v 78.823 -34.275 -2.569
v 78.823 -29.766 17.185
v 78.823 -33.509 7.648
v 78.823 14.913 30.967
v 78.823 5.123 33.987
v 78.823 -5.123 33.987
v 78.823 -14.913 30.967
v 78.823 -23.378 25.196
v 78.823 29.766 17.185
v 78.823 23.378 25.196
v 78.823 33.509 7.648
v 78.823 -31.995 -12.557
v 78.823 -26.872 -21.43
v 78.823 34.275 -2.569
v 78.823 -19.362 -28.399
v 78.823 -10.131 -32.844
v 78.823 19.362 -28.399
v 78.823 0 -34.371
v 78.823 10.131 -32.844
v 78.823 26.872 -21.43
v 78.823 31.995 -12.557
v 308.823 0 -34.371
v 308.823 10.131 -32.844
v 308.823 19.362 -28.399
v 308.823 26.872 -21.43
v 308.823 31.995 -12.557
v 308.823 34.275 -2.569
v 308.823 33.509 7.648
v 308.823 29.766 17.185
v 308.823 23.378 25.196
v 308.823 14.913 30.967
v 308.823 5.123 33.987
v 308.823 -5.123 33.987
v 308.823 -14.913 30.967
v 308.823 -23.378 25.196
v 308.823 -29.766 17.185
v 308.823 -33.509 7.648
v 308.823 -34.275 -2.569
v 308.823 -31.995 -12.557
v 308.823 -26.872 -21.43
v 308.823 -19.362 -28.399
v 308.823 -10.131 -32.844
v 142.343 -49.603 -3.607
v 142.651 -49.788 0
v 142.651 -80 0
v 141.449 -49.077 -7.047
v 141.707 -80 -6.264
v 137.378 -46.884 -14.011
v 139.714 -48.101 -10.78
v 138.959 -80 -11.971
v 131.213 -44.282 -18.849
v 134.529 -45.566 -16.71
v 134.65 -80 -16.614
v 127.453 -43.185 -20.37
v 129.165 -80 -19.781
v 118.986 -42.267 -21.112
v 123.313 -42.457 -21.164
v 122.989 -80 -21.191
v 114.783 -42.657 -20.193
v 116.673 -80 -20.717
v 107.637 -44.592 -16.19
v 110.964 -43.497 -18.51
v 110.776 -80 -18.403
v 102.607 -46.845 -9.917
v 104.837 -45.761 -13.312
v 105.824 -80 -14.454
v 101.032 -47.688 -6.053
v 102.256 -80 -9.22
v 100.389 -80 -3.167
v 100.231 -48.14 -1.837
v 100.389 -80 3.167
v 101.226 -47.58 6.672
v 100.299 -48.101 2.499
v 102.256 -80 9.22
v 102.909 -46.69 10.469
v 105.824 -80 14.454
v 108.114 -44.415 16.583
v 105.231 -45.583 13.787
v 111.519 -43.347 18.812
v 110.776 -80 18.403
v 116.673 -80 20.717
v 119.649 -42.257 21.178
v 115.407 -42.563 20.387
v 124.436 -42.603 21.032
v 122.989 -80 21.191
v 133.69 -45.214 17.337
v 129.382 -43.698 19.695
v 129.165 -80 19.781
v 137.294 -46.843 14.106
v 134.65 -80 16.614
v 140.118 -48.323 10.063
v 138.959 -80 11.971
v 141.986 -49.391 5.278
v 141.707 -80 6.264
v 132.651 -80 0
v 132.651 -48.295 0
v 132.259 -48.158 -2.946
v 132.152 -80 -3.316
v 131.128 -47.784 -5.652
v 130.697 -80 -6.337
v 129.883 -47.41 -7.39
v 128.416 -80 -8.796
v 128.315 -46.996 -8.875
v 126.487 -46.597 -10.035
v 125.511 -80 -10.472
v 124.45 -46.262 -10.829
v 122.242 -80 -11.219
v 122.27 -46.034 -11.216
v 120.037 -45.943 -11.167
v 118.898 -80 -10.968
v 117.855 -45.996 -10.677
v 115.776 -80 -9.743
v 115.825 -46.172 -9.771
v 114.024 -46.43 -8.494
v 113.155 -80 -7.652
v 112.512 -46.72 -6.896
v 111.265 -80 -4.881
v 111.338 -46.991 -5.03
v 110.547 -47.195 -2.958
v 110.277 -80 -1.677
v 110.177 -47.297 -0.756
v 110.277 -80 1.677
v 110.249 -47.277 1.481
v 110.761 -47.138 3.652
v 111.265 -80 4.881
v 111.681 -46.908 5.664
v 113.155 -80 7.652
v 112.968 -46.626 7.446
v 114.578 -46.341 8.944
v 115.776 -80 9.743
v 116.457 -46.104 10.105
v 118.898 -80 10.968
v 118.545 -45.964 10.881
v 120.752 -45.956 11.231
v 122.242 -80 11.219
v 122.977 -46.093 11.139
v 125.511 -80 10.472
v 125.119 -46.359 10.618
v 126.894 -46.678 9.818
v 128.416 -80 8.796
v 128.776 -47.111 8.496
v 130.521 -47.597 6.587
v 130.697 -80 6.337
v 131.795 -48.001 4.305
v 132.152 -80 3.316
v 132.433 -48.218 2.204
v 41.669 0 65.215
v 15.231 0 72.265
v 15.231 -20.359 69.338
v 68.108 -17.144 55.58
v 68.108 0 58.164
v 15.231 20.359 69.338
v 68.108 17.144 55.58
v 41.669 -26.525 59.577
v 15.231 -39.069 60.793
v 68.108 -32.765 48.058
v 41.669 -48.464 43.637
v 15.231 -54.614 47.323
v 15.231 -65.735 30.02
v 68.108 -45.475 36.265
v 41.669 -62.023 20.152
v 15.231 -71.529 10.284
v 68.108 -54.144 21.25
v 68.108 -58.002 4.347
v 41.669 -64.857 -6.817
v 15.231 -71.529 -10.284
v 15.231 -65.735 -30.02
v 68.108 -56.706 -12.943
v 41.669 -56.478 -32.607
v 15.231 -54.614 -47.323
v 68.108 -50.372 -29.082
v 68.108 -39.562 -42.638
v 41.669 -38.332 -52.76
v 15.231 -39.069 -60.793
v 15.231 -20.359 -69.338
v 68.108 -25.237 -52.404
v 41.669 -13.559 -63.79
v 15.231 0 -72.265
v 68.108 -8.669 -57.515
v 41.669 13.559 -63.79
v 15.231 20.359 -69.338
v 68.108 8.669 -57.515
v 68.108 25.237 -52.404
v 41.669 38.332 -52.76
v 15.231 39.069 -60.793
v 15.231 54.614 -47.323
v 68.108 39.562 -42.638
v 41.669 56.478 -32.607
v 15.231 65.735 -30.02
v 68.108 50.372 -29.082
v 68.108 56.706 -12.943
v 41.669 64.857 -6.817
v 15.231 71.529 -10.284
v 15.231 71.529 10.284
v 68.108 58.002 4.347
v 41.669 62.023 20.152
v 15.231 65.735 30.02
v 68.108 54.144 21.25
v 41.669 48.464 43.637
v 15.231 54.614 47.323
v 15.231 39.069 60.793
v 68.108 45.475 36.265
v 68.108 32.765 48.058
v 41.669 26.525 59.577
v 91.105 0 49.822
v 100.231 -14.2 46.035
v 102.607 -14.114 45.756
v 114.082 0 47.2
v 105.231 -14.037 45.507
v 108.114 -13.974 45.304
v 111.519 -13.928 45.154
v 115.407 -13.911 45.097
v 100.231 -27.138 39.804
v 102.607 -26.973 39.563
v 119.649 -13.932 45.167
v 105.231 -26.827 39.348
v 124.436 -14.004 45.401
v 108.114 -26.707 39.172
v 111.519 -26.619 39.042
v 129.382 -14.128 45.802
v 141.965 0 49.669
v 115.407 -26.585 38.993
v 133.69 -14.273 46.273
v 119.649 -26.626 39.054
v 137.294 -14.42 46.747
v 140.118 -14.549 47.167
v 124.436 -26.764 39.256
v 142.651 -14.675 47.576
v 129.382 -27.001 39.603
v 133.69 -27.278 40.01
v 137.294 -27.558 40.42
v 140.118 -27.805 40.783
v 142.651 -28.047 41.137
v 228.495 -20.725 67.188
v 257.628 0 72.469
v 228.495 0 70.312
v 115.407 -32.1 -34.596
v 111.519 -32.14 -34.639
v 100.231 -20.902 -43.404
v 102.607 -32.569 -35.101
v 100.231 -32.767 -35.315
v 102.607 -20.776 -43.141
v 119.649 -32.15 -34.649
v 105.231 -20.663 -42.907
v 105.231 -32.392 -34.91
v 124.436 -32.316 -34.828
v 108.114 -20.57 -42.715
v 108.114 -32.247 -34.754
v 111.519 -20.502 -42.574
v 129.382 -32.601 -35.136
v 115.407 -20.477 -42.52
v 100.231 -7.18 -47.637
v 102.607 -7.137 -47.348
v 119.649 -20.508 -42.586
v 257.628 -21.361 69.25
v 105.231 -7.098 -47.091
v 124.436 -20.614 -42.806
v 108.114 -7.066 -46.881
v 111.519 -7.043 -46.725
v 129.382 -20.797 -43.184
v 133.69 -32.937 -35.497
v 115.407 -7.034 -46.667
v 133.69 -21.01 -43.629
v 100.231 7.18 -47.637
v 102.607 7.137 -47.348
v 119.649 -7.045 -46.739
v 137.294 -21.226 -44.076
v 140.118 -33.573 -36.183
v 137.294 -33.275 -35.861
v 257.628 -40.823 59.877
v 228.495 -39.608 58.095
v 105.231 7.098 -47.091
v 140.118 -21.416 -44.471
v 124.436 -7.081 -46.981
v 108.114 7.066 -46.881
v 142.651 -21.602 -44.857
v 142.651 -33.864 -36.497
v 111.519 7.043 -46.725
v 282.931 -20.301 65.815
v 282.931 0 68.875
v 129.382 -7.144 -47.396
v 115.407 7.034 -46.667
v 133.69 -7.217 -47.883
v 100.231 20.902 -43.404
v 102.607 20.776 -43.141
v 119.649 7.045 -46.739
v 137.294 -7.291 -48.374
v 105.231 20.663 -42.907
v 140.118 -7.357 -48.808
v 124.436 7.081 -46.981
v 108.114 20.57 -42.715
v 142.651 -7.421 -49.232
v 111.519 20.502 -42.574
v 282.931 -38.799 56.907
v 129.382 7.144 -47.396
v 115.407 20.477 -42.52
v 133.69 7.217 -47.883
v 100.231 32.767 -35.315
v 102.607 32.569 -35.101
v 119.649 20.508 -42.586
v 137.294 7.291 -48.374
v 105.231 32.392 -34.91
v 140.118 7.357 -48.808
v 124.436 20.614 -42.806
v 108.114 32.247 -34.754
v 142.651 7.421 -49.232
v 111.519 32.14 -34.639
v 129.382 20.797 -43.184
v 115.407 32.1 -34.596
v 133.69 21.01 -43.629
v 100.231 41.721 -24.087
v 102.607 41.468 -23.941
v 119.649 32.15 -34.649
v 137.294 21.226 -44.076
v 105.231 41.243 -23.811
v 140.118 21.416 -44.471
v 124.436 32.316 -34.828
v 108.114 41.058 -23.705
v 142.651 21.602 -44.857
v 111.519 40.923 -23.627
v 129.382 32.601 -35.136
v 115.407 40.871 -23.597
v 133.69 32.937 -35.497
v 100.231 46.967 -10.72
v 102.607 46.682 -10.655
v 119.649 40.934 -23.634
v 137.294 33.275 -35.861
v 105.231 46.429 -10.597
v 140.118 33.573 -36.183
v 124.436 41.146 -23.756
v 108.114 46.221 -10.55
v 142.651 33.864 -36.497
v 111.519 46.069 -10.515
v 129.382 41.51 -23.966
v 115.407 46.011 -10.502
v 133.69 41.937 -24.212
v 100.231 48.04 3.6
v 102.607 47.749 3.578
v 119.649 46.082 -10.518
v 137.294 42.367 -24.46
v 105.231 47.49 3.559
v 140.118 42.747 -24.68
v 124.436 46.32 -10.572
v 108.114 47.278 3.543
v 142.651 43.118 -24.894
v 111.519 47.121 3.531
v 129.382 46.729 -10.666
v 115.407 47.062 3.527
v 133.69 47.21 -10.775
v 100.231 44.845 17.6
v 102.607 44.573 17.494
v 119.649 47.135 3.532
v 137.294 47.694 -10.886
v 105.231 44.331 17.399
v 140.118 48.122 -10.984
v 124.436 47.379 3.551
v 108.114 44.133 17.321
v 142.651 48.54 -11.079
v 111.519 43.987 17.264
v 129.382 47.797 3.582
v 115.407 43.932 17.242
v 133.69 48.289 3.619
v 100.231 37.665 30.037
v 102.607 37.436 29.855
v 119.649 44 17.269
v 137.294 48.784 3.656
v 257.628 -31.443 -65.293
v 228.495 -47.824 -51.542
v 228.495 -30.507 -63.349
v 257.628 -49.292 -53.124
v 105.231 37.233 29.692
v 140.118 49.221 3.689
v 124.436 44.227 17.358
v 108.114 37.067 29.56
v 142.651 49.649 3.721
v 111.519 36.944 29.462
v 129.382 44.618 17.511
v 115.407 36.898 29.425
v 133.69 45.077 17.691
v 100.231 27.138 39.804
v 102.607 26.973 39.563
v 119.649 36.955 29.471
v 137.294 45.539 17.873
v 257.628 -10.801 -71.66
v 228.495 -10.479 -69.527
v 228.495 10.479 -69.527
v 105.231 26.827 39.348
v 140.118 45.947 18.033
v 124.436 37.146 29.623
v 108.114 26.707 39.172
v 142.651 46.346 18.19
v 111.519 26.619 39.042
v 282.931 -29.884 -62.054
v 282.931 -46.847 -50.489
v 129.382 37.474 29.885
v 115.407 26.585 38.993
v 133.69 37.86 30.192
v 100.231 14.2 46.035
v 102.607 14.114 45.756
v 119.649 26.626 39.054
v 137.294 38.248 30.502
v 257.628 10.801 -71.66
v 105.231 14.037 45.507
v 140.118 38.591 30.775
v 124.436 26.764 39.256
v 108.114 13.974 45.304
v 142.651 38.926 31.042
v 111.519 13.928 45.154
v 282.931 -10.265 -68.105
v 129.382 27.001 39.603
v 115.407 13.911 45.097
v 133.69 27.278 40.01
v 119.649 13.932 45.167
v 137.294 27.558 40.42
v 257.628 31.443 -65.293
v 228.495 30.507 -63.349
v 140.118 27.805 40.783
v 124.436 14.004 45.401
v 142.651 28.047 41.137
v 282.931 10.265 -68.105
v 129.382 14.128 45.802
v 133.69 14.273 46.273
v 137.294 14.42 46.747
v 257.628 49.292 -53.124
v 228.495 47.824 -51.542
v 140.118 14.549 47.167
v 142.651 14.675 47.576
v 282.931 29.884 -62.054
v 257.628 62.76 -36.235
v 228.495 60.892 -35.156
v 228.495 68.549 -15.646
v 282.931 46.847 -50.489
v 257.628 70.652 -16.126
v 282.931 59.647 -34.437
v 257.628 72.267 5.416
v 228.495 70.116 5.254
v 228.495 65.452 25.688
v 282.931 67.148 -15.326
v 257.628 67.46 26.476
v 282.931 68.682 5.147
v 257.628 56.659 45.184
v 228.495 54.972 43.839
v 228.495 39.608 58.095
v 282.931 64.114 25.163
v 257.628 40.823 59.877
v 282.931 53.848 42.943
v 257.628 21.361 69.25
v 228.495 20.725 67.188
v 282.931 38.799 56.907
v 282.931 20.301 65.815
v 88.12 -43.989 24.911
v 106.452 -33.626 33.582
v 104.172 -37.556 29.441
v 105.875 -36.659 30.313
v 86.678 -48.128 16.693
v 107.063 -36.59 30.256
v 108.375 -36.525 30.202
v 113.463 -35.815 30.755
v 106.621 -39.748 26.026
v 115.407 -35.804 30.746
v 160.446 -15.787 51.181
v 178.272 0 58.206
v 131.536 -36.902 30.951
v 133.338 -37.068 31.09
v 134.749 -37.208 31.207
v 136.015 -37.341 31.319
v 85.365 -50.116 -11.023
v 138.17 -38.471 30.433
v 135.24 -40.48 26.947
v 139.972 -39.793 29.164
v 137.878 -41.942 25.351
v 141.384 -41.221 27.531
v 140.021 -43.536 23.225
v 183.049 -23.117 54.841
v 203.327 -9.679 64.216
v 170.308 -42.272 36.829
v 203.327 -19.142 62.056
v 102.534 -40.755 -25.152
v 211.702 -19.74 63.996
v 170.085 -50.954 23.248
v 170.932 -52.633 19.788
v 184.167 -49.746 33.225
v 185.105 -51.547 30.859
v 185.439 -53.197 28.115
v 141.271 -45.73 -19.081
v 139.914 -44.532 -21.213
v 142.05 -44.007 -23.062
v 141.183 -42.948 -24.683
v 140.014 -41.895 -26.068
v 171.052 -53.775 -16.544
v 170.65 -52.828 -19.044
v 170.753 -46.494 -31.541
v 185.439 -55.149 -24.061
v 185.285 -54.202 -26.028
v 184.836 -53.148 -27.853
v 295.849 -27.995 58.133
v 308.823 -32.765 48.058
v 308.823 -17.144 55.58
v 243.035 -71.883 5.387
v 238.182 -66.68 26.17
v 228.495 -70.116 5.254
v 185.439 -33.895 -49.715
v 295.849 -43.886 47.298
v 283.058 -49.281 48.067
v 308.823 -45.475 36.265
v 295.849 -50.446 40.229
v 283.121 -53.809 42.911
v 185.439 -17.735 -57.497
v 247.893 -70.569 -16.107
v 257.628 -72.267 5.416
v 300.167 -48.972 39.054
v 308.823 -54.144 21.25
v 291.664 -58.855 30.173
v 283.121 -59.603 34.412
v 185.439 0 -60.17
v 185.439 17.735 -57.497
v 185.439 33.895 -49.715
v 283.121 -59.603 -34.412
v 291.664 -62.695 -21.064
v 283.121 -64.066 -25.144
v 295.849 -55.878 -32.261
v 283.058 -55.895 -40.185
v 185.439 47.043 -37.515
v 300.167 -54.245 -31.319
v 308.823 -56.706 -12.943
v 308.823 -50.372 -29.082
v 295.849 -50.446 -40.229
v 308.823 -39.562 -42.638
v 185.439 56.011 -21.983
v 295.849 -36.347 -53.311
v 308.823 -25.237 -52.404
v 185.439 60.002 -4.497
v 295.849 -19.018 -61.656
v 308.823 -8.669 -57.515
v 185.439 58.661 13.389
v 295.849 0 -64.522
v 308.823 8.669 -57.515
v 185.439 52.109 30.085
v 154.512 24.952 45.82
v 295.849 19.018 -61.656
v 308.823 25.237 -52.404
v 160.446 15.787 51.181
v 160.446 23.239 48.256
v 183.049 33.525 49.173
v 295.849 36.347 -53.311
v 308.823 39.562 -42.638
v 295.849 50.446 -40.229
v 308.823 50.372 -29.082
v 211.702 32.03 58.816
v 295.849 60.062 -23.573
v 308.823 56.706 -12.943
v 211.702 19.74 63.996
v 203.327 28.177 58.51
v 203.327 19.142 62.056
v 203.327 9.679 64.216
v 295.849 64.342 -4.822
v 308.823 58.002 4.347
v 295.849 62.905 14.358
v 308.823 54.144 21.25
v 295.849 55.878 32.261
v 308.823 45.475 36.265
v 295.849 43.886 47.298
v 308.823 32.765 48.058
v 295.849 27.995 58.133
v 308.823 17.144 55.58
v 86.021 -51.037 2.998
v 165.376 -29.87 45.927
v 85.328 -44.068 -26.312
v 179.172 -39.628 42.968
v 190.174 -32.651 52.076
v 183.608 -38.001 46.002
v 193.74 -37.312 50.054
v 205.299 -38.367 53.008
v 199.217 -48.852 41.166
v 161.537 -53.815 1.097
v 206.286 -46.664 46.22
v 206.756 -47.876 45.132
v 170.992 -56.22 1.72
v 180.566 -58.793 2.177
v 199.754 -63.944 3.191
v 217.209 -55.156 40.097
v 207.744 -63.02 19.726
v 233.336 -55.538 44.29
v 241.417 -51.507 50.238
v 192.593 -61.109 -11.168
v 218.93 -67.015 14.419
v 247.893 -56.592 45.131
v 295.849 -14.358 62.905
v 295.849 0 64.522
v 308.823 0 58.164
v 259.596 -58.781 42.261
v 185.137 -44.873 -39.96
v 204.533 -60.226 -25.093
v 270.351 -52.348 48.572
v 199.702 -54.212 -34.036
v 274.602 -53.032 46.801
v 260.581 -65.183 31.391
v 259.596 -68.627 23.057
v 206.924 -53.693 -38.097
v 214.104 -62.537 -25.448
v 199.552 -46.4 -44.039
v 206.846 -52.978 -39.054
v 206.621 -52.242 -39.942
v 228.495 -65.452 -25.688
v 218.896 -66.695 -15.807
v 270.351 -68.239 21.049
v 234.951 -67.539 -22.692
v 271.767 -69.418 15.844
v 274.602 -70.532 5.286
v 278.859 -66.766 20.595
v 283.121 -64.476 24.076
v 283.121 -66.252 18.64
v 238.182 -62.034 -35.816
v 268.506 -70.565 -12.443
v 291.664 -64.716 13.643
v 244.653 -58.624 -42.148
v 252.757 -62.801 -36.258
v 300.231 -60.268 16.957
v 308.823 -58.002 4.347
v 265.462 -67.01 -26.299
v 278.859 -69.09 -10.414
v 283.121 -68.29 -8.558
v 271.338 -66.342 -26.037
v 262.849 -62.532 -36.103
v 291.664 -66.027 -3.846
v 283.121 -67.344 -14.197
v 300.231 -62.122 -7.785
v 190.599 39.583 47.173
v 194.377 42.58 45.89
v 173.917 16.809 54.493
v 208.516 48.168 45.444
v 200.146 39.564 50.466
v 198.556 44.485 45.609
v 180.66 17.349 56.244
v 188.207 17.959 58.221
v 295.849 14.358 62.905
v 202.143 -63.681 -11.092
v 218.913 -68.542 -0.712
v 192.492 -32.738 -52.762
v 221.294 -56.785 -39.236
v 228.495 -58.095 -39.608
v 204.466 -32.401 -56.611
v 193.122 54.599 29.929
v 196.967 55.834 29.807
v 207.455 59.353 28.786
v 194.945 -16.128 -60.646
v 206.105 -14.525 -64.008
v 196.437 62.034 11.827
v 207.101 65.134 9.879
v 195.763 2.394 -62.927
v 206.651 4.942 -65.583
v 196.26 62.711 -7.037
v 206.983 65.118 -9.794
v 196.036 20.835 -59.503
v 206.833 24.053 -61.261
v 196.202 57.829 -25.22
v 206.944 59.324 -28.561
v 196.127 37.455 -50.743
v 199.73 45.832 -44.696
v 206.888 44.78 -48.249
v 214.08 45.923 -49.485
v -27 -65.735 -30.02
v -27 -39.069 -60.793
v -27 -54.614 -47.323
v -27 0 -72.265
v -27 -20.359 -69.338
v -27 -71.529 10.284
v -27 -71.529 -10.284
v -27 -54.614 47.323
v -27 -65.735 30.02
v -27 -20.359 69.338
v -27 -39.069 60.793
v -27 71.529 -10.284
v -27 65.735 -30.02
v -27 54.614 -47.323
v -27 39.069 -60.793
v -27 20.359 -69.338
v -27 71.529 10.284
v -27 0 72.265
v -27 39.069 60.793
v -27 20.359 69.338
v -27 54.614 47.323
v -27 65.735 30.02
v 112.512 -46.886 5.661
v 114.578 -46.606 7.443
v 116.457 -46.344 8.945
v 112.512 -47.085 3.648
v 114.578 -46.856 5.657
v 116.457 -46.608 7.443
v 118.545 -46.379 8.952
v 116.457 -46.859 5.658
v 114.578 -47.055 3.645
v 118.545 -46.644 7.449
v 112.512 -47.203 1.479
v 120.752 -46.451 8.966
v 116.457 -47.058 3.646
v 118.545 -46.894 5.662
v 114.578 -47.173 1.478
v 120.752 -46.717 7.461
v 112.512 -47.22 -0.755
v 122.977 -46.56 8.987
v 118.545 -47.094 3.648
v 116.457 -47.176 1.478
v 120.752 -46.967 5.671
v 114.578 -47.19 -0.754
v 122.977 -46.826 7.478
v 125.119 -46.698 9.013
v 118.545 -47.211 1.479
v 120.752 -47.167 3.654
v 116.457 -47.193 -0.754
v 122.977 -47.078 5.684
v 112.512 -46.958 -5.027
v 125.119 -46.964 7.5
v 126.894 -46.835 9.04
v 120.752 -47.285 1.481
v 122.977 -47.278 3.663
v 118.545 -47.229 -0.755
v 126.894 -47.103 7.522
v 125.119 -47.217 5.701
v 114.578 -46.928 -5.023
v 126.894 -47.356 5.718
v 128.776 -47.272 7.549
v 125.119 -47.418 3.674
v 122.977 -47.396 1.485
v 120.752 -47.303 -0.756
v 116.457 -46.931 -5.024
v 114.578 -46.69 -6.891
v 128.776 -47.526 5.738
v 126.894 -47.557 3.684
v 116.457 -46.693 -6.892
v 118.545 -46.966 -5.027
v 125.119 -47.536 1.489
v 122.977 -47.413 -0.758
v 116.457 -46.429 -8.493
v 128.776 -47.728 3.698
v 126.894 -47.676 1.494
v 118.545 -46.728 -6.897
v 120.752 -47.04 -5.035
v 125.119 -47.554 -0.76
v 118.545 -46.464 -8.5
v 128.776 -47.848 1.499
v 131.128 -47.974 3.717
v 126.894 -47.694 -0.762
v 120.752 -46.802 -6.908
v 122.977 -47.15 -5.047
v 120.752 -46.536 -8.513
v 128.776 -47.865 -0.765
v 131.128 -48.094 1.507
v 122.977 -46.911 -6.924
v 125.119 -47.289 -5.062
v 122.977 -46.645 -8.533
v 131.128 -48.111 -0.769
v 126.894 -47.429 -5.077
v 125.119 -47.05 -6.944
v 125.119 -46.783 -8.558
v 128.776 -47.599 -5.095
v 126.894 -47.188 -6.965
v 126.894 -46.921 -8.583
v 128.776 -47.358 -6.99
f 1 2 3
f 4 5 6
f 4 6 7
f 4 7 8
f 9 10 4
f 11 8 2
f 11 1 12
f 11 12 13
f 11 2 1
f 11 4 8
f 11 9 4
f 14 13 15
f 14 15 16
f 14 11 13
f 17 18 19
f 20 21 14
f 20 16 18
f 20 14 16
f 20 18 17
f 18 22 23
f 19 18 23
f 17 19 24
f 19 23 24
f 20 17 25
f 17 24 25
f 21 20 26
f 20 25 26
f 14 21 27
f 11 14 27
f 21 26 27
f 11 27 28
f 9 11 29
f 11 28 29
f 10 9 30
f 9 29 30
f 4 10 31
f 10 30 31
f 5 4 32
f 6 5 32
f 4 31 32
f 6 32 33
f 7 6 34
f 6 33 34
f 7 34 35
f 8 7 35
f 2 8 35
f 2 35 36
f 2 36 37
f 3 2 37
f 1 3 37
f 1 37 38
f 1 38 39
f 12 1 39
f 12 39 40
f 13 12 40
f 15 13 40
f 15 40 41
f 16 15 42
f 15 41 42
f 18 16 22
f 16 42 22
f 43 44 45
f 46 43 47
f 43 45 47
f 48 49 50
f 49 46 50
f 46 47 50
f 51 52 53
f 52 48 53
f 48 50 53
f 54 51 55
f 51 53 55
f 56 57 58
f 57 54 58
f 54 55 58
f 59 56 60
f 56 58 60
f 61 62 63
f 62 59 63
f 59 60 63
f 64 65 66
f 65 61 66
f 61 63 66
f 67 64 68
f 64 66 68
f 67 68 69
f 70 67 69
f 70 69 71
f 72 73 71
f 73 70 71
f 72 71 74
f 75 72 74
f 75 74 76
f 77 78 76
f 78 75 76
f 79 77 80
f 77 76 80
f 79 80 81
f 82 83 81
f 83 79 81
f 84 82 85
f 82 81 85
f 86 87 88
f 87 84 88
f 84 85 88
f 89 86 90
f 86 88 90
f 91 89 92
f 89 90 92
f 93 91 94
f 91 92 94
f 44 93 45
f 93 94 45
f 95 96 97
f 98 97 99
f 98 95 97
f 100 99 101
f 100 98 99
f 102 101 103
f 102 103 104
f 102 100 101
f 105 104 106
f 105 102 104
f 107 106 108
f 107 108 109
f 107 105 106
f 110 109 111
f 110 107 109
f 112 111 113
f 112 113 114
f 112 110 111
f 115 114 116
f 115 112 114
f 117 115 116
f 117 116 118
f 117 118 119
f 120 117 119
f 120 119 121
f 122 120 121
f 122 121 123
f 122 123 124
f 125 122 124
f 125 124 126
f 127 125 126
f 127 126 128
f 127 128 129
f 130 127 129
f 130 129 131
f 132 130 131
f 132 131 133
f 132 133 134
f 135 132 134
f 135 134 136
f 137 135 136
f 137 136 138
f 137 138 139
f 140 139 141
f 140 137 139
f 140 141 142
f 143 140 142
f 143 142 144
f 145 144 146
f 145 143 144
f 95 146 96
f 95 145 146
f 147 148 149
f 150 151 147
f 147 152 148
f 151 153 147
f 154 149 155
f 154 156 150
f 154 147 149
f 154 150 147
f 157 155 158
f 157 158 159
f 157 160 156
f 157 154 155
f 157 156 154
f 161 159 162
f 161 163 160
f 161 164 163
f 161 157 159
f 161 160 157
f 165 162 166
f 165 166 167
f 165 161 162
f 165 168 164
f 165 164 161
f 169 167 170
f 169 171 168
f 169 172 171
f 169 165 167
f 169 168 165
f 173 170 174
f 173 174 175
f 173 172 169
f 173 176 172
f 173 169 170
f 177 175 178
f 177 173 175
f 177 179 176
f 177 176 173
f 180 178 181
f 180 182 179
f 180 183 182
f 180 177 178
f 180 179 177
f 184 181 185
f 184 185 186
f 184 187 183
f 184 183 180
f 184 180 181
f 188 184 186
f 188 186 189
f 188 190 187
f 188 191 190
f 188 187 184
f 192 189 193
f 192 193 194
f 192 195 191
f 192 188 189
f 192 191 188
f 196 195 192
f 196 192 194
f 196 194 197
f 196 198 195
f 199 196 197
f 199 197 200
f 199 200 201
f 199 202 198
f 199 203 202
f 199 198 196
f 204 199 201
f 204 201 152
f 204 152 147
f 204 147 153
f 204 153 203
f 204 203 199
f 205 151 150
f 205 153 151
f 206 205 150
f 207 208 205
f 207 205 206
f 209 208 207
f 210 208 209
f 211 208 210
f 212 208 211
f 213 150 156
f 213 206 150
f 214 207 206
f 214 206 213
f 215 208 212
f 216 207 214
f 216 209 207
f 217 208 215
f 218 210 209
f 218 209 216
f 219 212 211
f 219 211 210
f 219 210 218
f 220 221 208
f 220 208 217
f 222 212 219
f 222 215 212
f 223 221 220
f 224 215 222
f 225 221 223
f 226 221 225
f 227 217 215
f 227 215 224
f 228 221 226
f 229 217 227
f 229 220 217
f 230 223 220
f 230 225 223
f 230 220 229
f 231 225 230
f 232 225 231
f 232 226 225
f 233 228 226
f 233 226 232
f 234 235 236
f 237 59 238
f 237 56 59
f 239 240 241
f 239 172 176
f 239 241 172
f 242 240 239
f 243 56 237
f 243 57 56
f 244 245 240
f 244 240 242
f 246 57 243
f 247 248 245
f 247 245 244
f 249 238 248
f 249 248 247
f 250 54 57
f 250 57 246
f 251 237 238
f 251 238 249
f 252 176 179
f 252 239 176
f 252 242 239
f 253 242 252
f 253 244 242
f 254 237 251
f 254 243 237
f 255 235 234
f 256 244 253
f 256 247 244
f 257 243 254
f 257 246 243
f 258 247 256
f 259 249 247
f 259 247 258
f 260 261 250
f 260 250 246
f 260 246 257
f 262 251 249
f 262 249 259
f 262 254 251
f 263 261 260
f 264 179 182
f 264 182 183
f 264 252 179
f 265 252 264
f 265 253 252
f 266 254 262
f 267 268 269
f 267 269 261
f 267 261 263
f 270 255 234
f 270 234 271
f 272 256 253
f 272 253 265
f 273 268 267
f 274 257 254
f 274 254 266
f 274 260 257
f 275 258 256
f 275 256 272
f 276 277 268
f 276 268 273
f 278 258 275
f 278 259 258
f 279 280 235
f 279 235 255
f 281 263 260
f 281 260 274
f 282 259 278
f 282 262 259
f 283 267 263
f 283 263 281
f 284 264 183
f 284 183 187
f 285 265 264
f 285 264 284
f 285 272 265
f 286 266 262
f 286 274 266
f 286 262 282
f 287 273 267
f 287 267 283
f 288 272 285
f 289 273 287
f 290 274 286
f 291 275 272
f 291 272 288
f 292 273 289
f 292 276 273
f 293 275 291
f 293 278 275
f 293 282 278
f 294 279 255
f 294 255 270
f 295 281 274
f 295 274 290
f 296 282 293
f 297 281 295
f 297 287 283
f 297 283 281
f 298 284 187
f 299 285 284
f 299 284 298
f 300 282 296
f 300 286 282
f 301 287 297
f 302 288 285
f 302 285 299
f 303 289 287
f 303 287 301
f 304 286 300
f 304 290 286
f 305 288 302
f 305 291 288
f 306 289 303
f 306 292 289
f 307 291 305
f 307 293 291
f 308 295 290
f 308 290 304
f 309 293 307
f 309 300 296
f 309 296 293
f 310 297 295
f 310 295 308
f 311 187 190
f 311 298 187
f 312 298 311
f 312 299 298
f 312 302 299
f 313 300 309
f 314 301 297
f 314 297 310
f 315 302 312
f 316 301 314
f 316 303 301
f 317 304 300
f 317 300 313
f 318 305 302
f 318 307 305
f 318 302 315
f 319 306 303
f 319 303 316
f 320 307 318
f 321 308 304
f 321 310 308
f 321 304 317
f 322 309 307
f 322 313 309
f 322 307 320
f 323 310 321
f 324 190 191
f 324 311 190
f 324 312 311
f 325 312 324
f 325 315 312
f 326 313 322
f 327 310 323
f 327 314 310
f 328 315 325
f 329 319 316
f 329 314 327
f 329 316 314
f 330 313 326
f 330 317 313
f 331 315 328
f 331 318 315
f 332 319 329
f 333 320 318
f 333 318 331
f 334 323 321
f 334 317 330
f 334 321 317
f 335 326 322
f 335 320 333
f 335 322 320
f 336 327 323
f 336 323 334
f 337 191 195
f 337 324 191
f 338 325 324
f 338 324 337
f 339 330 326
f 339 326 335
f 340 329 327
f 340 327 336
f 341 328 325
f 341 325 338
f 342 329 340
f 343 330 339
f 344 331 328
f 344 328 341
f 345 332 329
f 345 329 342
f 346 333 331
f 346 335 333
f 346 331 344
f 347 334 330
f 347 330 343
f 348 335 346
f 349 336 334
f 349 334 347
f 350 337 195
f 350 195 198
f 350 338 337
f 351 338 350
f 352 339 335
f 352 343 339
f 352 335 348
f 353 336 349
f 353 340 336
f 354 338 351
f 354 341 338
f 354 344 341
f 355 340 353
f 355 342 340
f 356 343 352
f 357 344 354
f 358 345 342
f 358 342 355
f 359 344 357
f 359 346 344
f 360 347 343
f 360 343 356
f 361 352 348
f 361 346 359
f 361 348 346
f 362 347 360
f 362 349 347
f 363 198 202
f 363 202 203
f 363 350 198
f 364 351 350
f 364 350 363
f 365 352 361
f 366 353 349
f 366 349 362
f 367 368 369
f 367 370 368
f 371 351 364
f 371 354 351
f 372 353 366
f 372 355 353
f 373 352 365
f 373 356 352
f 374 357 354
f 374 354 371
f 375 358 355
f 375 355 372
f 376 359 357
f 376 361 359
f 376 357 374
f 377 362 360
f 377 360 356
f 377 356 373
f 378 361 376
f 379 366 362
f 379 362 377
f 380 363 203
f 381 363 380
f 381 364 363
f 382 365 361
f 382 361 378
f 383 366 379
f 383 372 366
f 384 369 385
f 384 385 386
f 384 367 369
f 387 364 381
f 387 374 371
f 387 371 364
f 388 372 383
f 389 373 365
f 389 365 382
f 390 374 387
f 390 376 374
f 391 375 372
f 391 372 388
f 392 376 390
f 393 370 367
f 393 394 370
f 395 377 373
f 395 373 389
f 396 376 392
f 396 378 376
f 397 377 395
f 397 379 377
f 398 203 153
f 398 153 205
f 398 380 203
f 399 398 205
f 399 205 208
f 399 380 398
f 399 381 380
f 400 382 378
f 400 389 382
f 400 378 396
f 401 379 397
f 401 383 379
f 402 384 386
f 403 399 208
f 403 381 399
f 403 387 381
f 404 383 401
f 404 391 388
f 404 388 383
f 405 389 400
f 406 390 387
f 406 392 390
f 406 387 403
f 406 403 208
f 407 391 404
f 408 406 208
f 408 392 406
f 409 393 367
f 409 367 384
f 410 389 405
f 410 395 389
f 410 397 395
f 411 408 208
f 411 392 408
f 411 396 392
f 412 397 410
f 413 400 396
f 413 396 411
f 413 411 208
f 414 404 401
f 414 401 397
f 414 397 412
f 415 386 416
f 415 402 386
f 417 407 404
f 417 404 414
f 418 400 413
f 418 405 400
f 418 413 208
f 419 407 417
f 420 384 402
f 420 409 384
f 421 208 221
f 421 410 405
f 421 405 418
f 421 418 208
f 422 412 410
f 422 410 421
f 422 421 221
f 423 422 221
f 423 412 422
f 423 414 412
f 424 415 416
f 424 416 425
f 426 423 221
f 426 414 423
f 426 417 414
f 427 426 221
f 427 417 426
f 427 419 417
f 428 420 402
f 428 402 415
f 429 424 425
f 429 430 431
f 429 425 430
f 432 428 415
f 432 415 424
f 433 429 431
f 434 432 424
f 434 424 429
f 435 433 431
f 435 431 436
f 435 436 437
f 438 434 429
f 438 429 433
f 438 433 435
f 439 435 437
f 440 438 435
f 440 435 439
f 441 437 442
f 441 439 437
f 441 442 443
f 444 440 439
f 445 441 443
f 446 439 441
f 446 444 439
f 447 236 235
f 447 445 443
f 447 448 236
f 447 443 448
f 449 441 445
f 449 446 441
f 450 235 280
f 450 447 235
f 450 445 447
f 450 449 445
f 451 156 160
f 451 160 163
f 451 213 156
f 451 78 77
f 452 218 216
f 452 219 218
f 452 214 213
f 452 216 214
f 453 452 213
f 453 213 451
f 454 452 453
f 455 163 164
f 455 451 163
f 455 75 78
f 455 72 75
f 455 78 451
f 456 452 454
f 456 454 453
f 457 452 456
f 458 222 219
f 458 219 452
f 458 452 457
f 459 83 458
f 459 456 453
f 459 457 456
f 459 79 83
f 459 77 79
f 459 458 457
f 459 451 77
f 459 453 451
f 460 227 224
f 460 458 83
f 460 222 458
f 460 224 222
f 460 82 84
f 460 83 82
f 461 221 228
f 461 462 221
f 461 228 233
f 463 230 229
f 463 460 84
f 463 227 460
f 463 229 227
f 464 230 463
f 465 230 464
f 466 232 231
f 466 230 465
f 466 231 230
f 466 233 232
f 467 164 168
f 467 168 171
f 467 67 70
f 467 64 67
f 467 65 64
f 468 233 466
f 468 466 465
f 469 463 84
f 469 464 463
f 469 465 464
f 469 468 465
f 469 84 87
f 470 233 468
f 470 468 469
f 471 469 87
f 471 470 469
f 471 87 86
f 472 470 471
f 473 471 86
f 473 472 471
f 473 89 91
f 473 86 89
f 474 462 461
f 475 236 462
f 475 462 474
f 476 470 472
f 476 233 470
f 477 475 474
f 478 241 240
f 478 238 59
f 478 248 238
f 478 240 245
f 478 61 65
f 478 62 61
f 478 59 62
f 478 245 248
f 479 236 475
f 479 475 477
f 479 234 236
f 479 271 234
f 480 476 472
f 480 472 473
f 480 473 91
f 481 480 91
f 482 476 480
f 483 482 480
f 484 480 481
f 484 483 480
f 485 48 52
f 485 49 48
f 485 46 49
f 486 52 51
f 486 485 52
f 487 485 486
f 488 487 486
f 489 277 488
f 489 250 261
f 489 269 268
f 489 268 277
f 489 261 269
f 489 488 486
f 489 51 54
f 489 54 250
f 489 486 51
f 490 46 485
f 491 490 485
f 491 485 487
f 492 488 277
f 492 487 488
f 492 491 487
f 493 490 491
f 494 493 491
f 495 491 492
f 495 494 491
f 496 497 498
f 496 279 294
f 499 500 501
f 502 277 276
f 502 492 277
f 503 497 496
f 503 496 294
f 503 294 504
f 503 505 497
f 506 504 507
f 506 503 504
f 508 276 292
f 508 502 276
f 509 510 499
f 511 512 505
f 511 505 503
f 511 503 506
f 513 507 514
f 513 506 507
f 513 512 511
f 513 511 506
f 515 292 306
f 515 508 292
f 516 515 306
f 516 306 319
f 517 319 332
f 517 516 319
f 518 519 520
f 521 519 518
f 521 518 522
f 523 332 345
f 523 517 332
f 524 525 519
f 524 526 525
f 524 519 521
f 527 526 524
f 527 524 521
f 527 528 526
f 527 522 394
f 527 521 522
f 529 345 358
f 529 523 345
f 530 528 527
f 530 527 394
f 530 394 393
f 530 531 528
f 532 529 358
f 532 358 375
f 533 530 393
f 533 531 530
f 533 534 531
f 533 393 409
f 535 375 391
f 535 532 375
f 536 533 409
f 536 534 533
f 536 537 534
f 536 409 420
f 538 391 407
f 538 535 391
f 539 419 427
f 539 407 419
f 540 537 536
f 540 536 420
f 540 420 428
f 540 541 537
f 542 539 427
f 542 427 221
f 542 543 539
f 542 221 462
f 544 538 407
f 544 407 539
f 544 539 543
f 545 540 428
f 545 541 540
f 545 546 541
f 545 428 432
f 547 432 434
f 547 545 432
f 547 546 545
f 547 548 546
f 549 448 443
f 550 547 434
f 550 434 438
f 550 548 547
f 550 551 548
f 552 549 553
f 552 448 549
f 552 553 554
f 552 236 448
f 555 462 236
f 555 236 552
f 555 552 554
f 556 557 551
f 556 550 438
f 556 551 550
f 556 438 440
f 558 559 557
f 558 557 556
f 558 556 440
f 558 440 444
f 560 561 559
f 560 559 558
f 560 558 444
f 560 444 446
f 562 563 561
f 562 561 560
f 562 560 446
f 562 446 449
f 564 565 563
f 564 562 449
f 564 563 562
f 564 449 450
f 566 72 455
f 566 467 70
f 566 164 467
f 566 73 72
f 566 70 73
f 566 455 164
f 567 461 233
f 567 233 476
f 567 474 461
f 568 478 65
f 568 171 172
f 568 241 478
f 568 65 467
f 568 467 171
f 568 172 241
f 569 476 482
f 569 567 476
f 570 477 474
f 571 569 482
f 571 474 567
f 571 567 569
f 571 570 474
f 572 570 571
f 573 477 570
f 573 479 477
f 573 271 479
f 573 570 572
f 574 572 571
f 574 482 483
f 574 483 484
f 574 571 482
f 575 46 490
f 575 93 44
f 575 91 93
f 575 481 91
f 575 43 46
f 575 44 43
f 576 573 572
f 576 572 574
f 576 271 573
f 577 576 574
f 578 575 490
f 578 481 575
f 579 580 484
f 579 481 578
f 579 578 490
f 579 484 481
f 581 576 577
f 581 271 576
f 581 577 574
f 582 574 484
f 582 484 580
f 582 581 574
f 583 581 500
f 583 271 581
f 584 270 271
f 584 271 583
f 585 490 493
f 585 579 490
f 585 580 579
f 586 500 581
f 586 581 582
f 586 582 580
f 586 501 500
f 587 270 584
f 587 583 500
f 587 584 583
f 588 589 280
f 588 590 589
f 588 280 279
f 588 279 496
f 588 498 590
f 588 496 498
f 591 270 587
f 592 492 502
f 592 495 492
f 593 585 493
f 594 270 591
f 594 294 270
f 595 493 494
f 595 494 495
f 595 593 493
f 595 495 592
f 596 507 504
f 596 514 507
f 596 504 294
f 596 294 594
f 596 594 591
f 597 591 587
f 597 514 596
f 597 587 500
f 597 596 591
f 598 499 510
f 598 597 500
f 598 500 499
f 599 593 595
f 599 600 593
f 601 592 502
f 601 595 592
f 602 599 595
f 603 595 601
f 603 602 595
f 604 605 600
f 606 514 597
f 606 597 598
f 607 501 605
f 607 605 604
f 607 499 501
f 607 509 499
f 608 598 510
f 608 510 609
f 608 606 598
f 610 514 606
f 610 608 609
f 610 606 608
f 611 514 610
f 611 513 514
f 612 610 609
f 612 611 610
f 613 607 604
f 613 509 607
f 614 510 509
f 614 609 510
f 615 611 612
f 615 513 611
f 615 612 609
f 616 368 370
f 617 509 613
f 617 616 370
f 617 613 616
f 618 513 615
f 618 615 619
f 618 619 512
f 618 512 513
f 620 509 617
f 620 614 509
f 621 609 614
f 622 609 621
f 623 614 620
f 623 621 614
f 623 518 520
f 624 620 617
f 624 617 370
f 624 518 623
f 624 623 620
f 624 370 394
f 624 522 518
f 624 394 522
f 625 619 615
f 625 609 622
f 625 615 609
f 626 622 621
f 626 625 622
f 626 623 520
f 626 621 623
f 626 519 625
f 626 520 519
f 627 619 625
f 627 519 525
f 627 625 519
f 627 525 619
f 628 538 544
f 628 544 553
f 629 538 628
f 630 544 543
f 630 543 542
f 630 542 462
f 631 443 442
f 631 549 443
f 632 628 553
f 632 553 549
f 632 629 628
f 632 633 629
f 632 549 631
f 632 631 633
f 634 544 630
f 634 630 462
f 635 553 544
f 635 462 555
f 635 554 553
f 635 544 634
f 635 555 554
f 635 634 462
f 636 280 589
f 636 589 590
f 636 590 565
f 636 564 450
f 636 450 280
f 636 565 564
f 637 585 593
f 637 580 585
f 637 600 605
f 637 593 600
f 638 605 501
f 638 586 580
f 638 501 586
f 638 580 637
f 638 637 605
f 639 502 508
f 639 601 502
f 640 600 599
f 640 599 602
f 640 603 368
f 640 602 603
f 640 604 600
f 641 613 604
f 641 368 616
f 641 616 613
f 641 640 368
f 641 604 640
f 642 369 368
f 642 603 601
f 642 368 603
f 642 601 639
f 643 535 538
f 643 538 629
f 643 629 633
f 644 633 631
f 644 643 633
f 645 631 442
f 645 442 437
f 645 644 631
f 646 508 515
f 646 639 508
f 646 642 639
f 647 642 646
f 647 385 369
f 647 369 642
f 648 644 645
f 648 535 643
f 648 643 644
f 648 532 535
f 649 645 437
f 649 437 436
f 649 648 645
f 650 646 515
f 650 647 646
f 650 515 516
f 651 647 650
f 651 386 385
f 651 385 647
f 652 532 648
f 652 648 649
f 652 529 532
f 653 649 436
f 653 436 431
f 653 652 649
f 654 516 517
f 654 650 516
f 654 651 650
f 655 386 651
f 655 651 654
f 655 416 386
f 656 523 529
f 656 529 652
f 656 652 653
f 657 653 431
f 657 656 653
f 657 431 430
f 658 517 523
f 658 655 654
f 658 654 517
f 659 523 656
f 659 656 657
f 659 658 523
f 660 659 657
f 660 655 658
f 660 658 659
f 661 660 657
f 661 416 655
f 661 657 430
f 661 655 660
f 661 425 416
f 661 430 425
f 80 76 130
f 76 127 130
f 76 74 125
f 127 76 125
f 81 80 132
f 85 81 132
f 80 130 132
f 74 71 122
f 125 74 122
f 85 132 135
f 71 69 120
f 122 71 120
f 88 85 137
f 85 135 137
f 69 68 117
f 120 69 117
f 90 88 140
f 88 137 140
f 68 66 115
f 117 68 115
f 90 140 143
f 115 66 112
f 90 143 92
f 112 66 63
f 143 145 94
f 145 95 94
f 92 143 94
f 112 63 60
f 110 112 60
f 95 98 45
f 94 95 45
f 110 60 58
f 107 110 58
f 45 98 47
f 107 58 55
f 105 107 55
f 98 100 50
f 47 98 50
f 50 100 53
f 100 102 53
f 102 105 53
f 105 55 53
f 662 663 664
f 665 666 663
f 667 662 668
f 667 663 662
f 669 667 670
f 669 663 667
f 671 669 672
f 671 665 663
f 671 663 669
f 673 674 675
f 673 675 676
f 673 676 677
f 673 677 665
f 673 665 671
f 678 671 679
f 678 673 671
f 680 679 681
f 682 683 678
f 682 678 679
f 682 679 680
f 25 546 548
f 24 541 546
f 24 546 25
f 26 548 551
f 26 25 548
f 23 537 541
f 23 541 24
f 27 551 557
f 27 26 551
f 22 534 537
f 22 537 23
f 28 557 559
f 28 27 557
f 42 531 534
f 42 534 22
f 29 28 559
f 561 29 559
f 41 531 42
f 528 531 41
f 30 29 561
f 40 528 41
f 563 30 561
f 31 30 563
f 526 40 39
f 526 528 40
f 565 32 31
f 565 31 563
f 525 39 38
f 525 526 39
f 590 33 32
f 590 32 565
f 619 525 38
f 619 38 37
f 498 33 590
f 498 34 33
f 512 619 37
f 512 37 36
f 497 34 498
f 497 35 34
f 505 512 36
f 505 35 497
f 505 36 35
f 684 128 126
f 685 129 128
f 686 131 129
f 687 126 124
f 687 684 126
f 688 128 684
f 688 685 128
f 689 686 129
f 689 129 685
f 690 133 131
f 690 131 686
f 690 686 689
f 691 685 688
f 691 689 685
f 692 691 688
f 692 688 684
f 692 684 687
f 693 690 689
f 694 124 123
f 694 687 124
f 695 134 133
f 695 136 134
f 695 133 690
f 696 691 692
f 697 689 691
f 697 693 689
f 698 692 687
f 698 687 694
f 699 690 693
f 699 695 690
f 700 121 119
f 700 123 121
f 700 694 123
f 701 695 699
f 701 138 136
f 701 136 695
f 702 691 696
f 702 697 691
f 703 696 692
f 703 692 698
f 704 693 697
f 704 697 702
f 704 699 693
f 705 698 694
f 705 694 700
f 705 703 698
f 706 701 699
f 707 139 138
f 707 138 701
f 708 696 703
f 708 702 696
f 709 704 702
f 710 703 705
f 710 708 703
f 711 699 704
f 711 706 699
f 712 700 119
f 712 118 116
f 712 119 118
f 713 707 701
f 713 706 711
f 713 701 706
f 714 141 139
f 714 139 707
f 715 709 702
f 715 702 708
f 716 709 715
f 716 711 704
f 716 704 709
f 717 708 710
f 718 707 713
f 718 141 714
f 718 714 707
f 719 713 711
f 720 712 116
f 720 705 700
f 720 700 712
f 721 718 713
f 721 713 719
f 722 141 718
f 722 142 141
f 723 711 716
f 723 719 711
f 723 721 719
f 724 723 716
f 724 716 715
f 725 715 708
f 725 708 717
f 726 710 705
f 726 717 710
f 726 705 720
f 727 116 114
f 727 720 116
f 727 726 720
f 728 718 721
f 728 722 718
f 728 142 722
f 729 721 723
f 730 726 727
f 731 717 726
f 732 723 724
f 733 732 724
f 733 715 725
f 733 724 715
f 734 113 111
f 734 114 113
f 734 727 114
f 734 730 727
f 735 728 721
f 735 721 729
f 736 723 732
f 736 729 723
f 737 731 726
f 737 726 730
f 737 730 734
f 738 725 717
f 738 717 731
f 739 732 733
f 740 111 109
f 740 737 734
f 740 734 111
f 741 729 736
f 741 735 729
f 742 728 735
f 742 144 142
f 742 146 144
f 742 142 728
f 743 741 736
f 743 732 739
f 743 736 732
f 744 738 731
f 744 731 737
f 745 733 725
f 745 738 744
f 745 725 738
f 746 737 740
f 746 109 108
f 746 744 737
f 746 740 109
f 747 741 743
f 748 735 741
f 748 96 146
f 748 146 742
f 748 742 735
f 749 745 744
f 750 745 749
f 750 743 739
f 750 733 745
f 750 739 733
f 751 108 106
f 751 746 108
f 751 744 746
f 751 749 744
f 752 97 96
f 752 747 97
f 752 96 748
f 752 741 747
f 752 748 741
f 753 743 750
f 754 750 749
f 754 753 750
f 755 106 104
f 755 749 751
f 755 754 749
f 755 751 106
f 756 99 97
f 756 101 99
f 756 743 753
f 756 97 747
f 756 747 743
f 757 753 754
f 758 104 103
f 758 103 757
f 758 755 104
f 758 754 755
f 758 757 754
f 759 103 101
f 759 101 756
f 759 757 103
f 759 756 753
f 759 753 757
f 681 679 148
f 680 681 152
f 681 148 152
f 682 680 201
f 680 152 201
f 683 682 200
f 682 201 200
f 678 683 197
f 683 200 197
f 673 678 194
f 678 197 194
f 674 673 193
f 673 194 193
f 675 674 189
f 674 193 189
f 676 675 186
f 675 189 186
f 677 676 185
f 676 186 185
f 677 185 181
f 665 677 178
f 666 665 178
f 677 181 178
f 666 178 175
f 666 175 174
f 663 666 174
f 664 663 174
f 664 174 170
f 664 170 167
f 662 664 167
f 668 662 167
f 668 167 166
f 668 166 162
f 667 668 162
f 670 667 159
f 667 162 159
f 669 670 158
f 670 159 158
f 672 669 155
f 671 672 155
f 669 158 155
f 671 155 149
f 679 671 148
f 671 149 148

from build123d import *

# Parameters (mm, degrees)
SKETCH_2_R           = 34.370841625
CUT_EXTRUDE_1_DEPTH  = 230
EXTRUDE_1_DEPTH      = 33
EXTRUDE_1_DEPTH_BACK = 10
SKETCH_3_R           = 21.25
SKETCH_3_R_2         = 11.25
SKETCH_4_R           = 72.26496
EXTRUDE_1_2_DEPTH    = 27


with BuildPart() as part:
    # 草圖1 → 旋轉1 (revolve)
    with BuildSketch(Plane.XY, mode=Mode.PRIVATE) as revolve_1_sk:
        with BuildLine():
            Line((0, 0), (0, 72.26496))
            Line((0, 72.26496), (15.231045419, 72.26496))
            Line((15.231045419, 72.26496), (68.107845419, 58.16448))
            add(Edge.make_bspline(
                [(68.107845419, 58.16448), (147.660376362, 17.815554571), (226.419832208, 105.291746385), (308.823182562, 58.16448)],
                knots=[0, 0, 0, 0, 1, 1, 1, 1], degree=3))
            Line((308.823182562, 58.16448), (308.823182562, 0))
            Line((308.823182562, 0), (0, 0))
        make_face()
    revolve(revolve_1_sk.sketch.rotate(Axis((0, 0, 0), (1, 0, 0)), 90), axis=Axis((0, 0, 0), (1, 0, 0)))

    # 草圖2 → 除料-伸長1 (cut)
    with BuildSketch(Plane(origin=(308.823182562, 0, 0), x_dir=(0, 0, -1), z_dir=(1, 0, 0))):
        Circle(SKETCH_2_R)
    extrude(amount=-CUT_EXTRUDE_1_DEPTH, mode=Mode.SUBTRACT)

    # 草圖3 → Extrude 1 (add, two sides: drawn at the far end of the back side and taken through both)
    with BuildSketch(Plane(origin=(0, -70, 0), x_dir=(1, 0, 0), z_dir=(0, 1, 0)).offset(-EXTRUDE_1_DEPTH_BACK)):
        with Locations((121.401340983, 0)):
            Circle(SKETCH_3_R)
        with Locations((121.401340983, 0)):
            Circle(SKETCH_3_R_2, mode=Mode.SUBTRACT)
    extrude(amount=EXTRUDE_1_DEPTH + EXTRUDE_1_DEPTH_BACK)

    # 草圖4 → Extrude 1 2 (add)
    with BuildSketch(Plane.ZY):
        Circle(SKETCH_4_R)
    extrude(amount=EXTRUDE_1_2_DEPTH)


solid = part.part
